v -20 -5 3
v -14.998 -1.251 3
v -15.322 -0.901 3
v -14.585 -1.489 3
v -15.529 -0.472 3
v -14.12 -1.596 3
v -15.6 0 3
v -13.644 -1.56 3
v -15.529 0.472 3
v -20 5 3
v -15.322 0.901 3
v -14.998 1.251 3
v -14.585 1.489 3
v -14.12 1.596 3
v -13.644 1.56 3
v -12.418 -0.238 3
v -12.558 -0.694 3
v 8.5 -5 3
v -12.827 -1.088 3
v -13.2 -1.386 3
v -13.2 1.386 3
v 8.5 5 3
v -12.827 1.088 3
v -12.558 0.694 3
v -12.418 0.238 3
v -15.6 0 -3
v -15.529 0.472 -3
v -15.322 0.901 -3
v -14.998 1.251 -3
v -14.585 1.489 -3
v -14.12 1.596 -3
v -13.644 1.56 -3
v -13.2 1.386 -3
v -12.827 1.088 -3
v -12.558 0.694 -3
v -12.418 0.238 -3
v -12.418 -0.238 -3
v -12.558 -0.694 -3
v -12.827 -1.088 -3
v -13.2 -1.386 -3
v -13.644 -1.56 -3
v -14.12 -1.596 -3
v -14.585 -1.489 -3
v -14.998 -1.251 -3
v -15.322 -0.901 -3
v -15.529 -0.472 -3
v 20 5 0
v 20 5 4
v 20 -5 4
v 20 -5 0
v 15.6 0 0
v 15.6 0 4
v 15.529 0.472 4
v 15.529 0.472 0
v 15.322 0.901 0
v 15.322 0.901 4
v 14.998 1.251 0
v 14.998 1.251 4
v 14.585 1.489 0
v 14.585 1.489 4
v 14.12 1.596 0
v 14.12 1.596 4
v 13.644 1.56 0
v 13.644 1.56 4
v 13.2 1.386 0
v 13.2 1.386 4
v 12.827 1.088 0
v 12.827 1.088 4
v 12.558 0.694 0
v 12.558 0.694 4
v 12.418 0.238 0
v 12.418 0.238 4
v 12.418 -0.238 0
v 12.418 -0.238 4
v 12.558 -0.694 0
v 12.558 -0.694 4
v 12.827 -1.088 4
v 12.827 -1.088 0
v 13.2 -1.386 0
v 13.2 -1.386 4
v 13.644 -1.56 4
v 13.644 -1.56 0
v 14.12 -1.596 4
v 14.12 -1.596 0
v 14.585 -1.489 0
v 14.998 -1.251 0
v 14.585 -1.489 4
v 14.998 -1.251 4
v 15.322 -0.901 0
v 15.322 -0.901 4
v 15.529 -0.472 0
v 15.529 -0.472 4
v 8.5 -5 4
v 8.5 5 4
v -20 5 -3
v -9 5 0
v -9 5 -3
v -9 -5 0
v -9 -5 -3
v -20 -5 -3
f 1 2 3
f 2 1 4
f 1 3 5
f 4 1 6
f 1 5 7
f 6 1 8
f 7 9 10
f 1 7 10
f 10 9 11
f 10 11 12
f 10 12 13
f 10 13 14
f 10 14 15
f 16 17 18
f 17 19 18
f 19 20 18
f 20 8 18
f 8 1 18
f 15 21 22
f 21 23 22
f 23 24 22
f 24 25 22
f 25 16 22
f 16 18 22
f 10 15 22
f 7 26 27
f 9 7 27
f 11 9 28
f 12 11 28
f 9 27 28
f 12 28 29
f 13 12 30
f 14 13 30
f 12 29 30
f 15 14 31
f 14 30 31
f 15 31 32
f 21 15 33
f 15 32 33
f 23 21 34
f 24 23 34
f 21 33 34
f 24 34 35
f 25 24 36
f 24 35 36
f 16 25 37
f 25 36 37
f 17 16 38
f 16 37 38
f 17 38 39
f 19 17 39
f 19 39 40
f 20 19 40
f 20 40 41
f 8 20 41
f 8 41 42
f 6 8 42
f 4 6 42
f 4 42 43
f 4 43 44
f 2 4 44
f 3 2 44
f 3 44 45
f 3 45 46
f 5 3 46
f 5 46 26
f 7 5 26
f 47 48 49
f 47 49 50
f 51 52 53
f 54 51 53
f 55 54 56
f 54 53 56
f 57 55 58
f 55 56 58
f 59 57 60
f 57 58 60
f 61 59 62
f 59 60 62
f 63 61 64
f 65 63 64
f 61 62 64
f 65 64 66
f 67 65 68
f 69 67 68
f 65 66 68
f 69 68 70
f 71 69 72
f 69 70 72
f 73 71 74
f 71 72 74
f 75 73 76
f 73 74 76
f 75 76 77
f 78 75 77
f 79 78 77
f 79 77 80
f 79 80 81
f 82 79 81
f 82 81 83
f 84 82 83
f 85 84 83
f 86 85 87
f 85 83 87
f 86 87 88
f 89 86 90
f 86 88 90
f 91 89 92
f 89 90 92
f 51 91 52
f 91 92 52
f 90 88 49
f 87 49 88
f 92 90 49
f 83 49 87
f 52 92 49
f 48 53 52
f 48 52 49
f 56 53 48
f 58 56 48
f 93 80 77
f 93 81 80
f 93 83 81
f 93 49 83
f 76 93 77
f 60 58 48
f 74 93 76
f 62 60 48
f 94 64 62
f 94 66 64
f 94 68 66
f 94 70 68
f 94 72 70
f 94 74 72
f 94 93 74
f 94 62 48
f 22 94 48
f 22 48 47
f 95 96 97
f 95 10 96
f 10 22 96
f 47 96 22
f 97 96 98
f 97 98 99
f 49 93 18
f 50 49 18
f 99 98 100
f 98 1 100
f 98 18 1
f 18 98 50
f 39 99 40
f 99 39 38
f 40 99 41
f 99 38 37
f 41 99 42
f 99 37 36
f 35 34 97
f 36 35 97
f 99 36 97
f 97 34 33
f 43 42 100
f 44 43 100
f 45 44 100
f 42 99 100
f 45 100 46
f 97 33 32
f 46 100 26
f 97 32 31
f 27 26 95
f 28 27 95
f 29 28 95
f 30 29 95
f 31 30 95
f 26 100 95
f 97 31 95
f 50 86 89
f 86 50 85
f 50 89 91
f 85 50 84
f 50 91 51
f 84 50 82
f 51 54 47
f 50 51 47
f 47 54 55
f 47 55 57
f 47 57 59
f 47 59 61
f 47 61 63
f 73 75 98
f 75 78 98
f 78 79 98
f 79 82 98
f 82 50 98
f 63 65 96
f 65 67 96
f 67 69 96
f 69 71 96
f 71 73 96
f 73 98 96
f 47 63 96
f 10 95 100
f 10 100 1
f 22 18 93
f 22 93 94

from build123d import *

# Parameters (mm, degrees)
SKETCH_1_W               = 35
SKETCH_1_H               = 10
EXTRUDE_1_DEPTH          = 3
SKETCH_2_W               = 9
SKETCH_2_H               = 10
EXTRUDE_2_DEPTH          = 1
SKETCH_3_R               = 1
EXTRUDE_3_DEPTH          = 8
SKETCH_4_W               = 6
SKETCH_4_H               = 10
EXTRUDE_4_DEPTH          = 3
SKETCH_5_R               = 1.5
CUT_EXTRUDE_1_DEPTH      = 6
SKETCH_6_W               = 6
SKETCH_6_H               = 10
EXTRUDE_5_DEPTH          = 5
SKETCH_7_R               = 1.6
CUT_EXTRUDE_2_DEPTH      = 8
CUT_EXTRUDE_2_DEPTH_BACK = 4
SKETCH_8_W               = 4
SKETCH_8_H               = 10
EXTRUDE_6_DEPTH          = 2.5
SKETCH_10_R              = 1.6
CUT_EXTRUDE_3_DEPTH      = 7
SKETCH_11_W              = 3
SKETCH_11_H              = 10
EXTRUDE_7_DEPTH          = 2.5
SKETCH_12_W              = 6
SKETCH_12_H              = 10
CUT_EXTRUDE_4_DEPTH      = 2.5


with BuildPart() as part:
    # 草圖1 → 填料-伸長1 (new body)
    with BuildSketch(Plane.XY):
        Rectangle(SKETCH_1_W, SKETCH_1_H)
    extrude(amount=EXTRUDE_1_DEPTH)

    # 草圖2 → 填料-伸長2 (add)
    with BuildSketch(Plane.XY.offset(3)):
        with Locations((13, 0)):
            Rectangle(SKETCH_2_W, SKETCH_2_H)
    extrude(amount=EXTRUDE_2_DEPTH)

    # 草圖3 → 填料-伸長3 (add)
    with BuildSketch(Plane.XY.offset(4)):
        with Locations((14, 0)):
            Circle(SKETCH_3_R)
    extrude(amount=EXTRUDE_3_DEPTH)

    # 草圖4 → 填料-伸長4 (add)
    with BuildSketch(Plane(origin=(0, 0, 0), x_dir=(-1, 0, 0), z_dir=(0, 0, -1))):
        with Locations((14.5, 0)):
            Rectangle(SKETCH_4_W, SKETCH_4_H)
    extrude(amount=EXTRUDE_4_DEPTH)

    # 草圖5 → 除料-伸長1 (cut)
    with BuildSketch(Plane(origin=(0, 0, -3), x_dir=(-1, 0, 0), z_dir=(0, 0, -1))):
        with Locations((14, 0)):
            Circle(SKETCH_5_R)
    extrude(amount=-CUT_EXTRUDE_1_DEPTH, mode=Mode.SUBTRACT)

    # 草圖6 → 填料-伸長5 (add)
    with BuildSketch(Plane.ZY.offset(17.5)):
        Rectangle(SKETCH_6_W, SKETCH_6_H)
    extrude(amount=EXTRUDE_5_DEPTH)

    # 草圖7 → 除料-伸長2 (cut, two sides)
    with BuildSketch(Plane.XY.offset(4)) as cut_extrude_2_sk:
        with Locations((14, 0)):
            Circle(SKETCH_7_R)
    extrude(amount=CUT_EXTRUDE_2_DEPTH, mode=Mode.SUBTRACT)
    extrude(cut_extrude_2_sk.sketch, amount=-CUT_EXTRUDE_2_DEPTH_BACK, mode=Mode.SUBTRACT)

    # 草圖8 → 填料-伸長6 (add)
    with BuildSketch(Plane(origin=(17.5, 0, 0), x_dir=(0, 0, -1), z_dir=(1, 0, 0))):
        with Locations((-2, 0)):
            Rectangle(SKETCH_8_W, SKETCH_8_H)
    extrude(amount=EXTRUDE_6_DEPTH)

    # 草圖10 → 除料-伸長3 (cut)
    with BuildSketch(Plane(origin=(0, 0, -3), x_dir=(-1, 0, 0), z_dir=(0, 0, -1))):
        with Locations((14, 0)):
            Circle(SKETCH_10_R)
    extrude(amount=-CUT_EXTRUDE_3_DEPTH, mode=Mode.SUBTRACT)

    # 草圖11 → 填料-伸長7 (add)
    with BuildSketch(Plane(origin=(-11.5, 0, 0), x_dir=(0, 0, -1), z_dir=(1, 0, 0))):
        with Locations((1.5, 0)):
            Rectangle(SKETCH_11_W, SKETCH_11_H)
    extrude(amount=EXTRUDE_7_DEPTH)

    # 草圖12 → 除料-伸長4 (cut)
    with BuildSketch(Plane.ZY.offset(22.5)):
        Rectangle(SKETCH_12_W, SKETCH_12_H)
    extrude(amount=-CUT_EXTRUDE_4_DEPTH, mode=Mode.SUBTRACT)


solid = part.part
